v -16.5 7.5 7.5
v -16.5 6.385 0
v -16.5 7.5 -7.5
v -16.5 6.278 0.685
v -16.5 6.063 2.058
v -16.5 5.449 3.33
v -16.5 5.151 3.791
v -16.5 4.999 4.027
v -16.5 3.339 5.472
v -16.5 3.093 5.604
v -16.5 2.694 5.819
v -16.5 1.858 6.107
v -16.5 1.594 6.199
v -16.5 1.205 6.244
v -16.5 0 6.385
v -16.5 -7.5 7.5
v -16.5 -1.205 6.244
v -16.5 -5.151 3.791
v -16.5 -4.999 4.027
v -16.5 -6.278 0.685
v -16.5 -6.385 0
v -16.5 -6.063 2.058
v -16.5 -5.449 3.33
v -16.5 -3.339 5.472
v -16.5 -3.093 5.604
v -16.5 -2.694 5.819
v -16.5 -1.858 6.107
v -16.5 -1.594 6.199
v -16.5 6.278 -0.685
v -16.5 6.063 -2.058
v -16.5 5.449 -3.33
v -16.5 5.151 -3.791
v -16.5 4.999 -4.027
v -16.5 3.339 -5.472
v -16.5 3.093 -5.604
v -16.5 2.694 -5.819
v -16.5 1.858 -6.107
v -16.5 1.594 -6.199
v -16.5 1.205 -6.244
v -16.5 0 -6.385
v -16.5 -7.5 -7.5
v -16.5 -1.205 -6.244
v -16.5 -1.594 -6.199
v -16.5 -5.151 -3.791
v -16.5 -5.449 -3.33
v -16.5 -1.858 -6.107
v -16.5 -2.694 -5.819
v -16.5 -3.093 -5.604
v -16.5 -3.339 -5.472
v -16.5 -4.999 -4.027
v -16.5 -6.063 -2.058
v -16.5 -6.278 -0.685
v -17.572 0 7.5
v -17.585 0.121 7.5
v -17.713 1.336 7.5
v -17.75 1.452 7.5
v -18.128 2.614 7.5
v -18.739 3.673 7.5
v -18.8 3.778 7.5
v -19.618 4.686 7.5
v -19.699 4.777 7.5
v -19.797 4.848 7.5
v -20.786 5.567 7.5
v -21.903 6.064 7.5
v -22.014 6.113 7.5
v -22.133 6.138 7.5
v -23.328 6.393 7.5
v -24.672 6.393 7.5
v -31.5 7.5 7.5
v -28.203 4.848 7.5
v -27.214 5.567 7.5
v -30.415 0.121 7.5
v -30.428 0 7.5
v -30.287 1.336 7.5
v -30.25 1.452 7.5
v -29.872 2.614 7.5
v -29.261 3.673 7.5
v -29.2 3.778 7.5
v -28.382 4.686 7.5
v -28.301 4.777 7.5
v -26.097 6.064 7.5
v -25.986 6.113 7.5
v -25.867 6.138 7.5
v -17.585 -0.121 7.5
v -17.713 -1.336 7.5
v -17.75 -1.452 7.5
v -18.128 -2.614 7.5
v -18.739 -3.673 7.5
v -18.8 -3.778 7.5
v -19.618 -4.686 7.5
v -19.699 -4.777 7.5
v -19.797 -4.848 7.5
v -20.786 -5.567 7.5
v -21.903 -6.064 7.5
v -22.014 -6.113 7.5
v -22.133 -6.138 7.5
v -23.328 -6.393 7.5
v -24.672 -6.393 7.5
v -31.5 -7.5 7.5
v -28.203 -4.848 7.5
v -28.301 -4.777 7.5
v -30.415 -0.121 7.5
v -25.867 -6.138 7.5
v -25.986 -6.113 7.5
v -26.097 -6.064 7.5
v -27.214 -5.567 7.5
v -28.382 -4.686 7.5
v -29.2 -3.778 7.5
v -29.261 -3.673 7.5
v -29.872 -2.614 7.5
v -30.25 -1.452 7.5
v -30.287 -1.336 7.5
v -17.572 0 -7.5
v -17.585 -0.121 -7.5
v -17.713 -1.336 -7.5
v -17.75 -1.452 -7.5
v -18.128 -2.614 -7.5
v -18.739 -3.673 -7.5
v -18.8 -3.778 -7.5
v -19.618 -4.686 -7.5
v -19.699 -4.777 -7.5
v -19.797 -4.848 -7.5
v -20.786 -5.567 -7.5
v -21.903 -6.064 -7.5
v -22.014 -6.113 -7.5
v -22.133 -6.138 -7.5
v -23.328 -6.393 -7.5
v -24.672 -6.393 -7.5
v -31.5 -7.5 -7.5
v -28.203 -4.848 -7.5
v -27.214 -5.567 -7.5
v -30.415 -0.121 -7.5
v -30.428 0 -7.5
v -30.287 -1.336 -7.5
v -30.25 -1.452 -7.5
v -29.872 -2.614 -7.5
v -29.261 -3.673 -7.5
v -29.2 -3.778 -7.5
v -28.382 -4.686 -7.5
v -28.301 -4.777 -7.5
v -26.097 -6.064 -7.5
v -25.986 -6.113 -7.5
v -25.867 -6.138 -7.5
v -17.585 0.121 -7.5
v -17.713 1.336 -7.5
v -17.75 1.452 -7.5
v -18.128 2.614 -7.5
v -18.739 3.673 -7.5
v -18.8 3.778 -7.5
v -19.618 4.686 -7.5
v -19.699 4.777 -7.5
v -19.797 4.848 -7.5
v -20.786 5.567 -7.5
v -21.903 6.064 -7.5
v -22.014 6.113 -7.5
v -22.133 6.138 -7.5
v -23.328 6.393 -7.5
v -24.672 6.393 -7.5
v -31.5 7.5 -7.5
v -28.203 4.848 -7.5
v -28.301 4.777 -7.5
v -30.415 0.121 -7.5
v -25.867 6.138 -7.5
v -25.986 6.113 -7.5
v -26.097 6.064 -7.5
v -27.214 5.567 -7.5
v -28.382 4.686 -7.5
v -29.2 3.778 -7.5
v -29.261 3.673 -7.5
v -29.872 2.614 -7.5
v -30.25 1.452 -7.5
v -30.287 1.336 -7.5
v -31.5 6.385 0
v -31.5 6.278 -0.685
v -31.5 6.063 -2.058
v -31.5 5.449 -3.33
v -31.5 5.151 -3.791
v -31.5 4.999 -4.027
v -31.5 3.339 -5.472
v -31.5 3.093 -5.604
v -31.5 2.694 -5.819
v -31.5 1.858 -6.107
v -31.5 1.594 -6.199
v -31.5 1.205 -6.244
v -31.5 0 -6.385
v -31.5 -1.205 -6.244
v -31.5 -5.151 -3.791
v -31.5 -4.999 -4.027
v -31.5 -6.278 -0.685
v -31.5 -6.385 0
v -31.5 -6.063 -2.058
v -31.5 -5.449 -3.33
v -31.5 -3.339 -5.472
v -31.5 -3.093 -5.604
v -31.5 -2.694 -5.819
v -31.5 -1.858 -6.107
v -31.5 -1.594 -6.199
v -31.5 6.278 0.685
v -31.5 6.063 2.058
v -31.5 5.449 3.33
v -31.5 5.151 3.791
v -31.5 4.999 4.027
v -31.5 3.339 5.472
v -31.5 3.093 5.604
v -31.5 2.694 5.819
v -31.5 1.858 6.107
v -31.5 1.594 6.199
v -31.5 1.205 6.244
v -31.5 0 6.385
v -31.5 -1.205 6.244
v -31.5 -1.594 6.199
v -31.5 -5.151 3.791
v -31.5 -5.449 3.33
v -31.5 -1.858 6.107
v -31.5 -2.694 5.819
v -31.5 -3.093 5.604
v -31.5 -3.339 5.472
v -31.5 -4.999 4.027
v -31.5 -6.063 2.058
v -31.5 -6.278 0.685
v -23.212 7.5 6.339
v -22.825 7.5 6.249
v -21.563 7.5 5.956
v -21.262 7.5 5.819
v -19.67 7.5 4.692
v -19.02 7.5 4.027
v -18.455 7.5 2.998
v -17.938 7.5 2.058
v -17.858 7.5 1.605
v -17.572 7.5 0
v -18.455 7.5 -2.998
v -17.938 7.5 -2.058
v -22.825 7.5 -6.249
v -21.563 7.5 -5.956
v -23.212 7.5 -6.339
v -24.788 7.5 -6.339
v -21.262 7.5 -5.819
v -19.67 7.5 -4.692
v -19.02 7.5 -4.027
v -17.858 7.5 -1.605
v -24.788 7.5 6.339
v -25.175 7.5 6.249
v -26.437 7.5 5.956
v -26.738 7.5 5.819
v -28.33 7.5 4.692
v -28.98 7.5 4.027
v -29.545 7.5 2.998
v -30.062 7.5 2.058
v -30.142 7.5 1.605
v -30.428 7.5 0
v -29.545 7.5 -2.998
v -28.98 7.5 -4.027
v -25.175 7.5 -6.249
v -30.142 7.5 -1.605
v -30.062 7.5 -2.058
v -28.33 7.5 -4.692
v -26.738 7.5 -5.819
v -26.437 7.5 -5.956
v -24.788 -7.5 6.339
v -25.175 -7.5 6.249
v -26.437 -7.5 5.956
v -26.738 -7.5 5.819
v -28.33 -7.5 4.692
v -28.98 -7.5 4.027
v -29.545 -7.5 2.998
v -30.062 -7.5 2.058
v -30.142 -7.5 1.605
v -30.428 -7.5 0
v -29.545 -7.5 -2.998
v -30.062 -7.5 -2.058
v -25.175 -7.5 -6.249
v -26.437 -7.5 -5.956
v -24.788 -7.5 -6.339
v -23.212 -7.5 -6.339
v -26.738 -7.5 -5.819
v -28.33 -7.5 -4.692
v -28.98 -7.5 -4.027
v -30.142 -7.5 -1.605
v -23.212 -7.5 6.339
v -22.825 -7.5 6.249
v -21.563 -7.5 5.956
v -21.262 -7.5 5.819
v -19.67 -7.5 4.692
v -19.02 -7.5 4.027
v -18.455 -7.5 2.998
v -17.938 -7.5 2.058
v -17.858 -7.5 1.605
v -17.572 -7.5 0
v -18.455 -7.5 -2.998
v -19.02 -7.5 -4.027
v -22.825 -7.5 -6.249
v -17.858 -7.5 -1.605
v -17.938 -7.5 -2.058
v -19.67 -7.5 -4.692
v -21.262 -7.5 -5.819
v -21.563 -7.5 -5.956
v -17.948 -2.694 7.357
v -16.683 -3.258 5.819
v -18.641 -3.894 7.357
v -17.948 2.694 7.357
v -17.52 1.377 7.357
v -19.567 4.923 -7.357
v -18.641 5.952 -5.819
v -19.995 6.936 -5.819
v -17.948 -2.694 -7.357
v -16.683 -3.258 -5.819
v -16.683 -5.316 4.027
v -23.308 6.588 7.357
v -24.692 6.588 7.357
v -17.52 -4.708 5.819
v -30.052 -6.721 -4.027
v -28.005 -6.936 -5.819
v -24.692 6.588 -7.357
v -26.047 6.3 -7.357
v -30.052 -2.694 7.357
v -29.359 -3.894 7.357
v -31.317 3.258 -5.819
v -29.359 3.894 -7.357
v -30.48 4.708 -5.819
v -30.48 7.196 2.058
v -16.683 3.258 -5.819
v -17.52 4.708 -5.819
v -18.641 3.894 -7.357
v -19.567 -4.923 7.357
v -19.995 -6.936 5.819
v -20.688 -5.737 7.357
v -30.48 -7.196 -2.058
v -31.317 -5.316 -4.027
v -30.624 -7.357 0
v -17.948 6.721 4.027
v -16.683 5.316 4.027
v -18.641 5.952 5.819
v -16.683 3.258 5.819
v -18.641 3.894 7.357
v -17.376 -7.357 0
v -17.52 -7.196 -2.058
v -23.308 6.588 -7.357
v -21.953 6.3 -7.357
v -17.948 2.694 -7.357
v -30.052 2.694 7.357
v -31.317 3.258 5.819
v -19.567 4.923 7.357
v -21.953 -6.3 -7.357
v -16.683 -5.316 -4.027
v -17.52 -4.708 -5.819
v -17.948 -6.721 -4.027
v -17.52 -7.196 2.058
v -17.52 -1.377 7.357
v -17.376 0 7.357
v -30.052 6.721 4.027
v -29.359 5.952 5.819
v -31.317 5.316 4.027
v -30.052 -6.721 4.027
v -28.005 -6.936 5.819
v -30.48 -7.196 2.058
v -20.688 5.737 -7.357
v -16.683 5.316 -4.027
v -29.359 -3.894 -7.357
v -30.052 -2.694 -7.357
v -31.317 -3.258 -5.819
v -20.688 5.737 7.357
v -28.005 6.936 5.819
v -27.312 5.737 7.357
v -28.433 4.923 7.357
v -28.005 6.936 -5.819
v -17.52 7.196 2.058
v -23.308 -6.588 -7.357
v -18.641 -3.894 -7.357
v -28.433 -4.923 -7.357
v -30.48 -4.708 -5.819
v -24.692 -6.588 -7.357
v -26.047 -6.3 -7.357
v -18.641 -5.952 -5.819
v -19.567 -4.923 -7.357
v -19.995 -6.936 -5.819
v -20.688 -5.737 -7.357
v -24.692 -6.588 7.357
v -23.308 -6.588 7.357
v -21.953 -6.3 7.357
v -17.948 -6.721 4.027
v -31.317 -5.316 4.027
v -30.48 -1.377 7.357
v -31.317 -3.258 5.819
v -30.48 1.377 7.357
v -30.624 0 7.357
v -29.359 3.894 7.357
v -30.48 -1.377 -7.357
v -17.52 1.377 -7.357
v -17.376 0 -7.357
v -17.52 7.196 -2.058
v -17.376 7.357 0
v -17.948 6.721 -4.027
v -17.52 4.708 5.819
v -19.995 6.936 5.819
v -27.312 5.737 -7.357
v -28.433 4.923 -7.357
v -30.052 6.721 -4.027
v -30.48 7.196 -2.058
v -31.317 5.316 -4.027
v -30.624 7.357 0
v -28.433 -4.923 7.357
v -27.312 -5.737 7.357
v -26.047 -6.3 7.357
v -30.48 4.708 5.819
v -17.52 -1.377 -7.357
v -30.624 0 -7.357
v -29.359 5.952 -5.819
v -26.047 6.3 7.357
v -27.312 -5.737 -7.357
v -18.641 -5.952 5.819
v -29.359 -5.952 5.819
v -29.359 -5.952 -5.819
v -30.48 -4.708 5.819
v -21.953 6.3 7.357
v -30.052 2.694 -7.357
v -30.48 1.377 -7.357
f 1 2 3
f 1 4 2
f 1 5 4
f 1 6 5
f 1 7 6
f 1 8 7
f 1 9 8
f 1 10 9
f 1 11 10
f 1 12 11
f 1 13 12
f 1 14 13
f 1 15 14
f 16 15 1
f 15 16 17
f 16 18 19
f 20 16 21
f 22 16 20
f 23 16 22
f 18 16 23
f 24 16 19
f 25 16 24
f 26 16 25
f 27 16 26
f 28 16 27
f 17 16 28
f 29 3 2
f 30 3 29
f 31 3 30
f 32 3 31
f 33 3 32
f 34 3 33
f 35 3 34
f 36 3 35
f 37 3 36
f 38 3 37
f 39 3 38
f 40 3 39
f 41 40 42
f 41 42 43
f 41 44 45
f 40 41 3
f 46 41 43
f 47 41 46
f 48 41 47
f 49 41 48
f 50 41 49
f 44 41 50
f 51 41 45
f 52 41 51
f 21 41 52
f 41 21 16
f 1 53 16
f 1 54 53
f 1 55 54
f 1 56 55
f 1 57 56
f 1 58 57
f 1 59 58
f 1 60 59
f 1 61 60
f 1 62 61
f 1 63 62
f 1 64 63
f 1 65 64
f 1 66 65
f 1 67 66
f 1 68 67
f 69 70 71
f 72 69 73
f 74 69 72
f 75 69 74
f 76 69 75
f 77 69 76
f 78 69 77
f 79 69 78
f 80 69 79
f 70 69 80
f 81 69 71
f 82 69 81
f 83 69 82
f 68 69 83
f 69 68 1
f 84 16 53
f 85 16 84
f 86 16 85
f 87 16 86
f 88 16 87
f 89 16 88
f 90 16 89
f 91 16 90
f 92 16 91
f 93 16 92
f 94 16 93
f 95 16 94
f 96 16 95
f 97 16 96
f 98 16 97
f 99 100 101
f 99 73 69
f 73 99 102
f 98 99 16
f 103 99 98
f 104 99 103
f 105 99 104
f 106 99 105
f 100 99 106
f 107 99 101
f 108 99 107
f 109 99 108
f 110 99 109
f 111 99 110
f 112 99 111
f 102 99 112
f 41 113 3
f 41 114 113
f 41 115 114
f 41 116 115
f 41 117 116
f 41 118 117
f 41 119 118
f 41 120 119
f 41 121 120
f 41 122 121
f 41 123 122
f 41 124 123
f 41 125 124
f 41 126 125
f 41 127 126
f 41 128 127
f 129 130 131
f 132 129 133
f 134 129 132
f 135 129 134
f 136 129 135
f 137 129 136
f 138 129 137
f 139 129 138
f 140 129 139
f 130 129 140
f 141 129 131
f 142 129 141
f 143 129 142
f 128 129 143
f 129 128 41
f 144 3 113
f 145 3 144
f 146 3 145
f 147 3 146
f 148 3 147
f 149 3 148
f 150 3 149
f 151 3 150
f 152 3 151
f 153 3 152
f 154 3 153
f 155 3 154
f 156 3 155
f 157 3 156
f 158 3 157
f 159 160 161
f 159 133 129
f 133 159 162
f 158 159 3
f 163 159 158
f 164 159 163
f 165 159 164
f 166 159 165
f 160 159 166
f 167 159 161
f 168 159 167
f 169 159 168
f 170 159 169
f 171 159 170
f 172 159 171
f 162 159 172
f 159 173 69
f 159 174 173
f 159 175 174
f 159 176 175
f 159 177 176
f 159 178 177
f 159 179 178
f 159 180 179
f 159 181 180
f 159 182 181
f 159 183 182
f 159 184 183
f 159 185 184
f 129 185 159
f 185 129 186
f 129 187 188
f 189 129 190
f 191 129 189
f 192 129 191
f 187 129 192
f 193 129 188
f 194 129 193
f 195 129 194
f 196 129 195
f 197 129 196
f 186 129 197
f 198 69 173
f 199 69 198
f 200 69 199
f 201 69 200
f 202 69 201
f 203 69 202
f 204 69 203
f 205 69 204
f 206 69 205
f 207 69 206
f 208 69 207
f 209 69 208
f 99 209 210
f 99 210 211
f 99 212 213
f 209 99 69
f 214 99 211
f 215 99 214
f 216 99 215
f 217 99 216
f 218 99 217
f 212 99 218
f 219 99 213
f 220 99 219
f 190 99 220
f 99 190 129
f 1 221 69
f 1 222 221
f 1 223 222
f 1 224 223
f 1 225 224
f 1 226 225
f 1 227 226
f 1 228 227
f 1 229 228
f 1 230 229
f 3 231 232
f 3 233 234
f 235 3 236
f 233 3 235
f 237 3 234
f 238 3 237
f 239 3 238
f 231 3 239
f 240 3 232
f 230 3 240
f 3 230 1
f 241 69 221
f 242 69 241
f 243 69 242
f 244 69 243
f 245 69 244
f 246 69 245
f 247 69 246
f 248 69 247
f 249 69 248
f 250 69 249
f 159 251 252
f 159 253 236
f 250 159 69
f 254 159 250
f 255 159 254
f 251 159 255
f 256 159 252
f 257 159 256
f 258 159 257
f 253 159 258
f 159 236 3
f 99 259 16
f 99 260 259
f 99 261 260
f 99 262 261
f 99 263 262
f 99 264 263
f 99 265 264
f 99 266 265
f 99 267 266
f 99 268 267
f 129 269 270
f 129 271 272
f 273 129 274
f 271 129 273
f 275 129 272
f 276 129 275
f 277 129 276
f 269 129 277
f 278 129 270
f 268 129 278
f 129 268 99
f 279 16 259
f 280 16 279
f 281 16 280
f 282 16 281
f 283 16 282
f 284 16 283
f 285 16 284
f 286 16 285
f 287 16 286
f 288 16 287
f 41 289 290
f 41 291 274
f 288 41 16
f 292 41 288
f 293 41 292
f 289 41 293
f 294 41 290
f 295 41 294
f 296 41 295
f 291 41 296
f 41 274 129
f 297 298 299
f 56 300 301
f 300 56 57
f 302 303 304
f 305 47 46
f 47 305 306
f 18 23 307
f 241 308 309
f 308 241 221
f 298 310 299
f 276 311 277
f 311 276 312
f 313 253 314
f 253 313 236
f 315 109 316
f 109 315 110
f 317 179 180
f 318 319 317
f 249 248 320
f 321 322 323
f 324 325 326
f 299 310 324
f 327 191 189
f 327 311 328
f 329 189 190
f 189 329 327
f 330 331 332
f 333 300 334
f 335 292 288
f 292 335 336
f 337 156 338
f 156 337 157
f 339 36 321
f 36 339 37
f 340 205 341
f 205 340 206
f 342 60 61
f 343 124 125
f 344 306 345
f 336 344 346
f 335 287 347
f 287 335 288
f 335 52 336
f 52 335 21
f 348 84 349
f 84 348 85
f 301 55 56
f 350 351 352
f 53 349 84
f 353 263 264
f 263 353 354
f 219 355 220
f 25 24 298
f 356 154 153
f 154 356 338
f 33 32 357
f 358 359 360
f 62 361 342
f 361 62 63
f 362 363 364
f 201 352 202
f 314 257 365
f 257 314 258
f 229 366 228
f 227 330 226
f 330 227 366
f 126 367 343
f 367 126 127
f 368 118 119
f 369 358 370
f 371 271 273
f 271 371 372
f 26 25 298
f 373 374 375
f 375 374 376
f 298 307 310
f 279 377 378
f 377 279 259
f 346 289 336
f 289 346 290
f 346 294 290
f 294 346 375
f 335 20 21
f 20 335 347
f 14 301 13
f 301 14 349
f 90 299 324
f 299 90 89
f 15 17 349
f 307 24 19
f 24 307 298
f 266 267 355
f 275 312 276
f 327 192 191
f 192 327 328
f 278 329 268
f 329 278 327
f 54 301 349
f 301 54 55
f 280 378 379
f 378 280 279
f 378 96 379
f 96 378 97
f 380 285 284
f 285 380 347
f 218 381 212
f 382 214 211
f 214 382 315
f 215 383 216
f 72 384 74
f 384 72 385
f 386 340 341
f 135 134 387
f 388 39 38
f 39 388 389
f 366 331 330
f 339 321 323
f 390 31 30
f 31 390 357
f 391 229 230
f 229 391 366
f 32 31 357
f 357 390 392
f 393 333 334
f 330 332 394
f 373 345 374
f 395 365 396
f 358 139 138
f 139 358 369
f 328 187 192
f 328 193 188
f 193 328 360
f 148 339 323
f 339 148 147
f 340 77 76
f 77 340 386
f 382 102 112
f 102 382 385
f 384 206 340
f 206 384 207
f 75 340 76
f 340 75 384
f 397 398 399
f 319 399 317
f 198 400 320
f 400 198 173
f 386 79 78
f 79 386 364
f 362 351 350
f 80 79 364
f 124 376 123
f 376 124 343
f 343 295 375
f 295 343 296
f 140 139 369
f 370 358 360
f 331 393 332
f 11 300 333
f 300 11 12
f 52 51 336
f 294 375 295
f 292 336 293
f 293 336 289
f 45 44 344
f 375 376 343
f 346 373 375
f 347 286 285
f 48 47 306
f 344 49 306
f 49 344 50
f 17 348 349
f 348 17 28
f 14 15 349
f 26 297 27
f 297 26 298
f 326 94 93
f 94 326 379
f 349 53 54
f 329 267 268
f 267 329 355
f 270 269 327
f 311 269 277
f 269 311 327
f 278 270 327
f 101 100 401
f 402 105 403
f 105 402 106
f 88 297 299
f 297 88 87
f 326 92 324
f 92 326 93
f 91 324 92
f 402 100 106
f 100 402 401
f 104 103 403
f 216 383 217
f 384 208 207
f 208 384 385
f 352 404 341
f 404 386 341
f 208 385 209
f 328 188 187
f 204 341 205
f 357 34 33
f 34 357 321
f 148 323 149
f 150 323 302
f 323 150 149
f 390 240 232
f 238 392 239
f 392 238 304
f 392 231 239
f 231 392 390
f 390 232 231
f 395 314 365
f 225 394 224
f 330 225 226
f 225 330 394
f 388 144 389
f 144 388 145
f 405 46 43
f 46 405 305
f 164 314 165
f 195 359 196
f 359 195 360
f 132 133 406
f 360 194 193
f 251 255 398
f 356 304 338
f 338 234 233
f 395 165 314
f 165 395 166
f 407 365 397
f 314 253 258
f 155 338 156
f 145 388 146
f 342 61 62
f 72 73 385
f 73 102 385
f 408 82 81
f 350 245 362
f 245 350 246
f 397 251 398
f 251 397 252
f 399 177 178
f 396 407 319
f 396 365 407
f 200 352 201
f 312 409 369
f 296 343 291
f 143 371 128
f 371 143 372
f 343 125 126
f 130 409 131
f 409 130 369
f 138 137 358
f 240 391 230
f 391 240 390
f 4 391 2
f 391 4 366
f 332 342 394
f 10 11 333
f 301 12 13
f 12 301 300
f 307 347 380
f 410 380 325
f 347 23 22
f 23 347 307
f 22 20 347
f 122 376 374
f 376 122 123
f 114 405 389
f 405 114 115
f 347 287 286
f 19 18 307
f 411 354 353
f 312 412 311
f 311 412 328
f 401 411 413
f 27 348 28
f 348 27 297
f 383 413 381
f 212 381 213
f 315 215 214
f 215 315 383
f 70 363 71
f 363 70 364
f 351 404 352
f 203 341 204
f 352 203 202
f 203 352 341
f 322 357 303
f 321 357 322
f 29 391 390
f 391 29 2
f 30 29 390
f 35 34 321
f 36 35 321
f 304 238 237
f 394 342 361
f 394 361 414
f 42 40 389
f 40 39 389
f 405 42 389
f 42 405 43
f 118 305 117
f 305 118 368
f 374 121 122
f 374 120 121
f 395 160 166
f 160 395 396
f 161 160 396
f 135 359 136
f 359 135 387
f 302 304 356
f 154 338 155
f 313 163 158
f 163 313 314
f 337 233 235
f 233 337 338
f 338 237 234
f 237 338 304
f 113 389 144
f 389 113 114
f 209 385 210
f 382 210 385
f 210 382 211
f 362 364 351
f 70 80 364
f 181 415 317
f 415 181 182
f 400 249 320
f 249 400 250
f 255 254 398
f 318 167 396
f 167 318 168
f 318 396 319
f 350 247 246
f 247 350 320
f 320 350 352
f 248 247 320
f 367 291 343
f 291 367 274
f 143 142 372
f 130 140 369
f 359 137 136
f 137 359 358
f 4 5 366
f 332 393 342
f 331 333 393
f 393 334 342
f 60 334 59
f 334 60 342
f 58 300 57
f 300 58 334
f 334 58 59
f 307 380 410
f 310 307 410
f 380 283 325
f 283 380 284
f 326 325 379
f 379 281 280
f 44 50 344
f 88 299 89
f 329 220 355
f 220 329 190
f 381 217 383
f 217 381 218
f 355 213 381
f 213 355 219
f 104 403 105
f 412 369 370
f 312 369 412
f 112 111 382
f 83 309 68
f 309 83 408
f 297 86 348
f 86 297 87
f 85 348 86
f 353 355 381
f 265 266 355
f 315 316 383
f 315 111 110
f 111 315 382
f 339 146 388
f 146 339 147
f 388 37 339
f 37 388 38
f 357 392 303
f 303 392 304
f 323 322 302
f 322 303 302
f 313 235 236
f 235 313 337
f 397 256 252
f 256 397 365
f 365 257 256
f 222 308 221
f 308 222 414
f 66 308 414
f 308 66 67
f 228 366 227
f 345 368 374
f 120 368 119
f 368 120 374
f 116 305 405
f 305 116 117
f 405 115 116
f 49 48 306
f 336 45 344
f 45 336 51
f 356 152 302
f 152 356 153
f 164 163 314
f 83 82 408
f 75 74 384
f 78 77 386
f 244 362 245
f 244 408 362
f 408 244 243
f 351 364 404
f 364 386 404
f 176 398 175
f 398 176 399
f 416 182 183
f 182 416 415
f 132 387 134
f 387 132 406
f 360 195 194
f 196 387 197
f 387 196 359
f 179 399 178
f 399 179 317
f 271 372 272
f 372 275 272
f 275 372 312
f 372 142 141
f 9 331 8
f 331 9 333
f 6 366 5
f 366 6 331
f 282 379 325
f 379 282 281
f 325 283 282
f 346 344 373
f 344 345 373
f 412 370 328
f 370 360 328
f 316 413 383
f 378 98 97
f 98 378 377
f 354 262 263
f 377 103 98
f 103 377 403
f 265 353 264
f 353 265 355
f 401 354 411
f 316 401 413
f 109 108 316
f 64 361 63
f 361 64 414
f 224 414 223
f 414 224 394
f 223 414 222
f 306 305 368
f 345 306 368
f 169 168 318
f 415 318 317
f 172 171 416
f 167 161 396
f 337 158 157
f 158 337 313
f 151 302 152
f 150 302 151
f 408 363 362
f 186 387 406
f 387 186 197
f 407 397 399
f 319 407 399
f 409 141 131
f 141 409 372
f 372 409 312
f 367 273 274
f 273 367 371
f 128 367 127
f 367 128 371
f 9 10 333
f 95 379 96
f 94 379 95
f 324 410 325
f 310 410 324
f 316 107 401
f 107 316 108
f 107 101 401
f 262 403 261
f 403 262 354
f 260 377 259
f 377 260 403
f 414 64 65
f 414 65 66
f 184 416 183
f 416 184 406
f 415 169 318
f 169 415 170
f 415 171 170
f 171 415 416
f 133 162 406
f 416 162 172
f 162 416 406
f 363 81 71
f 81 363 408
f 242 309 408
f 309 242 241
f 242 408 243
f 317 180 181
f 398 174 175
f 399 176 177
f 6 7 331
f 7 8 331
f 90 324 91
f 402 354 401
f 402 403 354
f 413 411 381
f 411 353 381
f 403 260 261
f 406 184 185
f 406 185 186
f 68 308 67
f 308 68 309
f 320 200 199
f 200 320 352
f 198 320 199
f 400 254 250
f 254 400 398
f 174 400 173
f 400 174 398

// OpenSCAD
// CSG.scad - Basic example of CSG usage

w =  15; 
h =  9.9;

translate([-24,0,0]) {
   render(convexity = 1) difference(){
        cube(w, center=true);
        sphere(h);
    }
}
